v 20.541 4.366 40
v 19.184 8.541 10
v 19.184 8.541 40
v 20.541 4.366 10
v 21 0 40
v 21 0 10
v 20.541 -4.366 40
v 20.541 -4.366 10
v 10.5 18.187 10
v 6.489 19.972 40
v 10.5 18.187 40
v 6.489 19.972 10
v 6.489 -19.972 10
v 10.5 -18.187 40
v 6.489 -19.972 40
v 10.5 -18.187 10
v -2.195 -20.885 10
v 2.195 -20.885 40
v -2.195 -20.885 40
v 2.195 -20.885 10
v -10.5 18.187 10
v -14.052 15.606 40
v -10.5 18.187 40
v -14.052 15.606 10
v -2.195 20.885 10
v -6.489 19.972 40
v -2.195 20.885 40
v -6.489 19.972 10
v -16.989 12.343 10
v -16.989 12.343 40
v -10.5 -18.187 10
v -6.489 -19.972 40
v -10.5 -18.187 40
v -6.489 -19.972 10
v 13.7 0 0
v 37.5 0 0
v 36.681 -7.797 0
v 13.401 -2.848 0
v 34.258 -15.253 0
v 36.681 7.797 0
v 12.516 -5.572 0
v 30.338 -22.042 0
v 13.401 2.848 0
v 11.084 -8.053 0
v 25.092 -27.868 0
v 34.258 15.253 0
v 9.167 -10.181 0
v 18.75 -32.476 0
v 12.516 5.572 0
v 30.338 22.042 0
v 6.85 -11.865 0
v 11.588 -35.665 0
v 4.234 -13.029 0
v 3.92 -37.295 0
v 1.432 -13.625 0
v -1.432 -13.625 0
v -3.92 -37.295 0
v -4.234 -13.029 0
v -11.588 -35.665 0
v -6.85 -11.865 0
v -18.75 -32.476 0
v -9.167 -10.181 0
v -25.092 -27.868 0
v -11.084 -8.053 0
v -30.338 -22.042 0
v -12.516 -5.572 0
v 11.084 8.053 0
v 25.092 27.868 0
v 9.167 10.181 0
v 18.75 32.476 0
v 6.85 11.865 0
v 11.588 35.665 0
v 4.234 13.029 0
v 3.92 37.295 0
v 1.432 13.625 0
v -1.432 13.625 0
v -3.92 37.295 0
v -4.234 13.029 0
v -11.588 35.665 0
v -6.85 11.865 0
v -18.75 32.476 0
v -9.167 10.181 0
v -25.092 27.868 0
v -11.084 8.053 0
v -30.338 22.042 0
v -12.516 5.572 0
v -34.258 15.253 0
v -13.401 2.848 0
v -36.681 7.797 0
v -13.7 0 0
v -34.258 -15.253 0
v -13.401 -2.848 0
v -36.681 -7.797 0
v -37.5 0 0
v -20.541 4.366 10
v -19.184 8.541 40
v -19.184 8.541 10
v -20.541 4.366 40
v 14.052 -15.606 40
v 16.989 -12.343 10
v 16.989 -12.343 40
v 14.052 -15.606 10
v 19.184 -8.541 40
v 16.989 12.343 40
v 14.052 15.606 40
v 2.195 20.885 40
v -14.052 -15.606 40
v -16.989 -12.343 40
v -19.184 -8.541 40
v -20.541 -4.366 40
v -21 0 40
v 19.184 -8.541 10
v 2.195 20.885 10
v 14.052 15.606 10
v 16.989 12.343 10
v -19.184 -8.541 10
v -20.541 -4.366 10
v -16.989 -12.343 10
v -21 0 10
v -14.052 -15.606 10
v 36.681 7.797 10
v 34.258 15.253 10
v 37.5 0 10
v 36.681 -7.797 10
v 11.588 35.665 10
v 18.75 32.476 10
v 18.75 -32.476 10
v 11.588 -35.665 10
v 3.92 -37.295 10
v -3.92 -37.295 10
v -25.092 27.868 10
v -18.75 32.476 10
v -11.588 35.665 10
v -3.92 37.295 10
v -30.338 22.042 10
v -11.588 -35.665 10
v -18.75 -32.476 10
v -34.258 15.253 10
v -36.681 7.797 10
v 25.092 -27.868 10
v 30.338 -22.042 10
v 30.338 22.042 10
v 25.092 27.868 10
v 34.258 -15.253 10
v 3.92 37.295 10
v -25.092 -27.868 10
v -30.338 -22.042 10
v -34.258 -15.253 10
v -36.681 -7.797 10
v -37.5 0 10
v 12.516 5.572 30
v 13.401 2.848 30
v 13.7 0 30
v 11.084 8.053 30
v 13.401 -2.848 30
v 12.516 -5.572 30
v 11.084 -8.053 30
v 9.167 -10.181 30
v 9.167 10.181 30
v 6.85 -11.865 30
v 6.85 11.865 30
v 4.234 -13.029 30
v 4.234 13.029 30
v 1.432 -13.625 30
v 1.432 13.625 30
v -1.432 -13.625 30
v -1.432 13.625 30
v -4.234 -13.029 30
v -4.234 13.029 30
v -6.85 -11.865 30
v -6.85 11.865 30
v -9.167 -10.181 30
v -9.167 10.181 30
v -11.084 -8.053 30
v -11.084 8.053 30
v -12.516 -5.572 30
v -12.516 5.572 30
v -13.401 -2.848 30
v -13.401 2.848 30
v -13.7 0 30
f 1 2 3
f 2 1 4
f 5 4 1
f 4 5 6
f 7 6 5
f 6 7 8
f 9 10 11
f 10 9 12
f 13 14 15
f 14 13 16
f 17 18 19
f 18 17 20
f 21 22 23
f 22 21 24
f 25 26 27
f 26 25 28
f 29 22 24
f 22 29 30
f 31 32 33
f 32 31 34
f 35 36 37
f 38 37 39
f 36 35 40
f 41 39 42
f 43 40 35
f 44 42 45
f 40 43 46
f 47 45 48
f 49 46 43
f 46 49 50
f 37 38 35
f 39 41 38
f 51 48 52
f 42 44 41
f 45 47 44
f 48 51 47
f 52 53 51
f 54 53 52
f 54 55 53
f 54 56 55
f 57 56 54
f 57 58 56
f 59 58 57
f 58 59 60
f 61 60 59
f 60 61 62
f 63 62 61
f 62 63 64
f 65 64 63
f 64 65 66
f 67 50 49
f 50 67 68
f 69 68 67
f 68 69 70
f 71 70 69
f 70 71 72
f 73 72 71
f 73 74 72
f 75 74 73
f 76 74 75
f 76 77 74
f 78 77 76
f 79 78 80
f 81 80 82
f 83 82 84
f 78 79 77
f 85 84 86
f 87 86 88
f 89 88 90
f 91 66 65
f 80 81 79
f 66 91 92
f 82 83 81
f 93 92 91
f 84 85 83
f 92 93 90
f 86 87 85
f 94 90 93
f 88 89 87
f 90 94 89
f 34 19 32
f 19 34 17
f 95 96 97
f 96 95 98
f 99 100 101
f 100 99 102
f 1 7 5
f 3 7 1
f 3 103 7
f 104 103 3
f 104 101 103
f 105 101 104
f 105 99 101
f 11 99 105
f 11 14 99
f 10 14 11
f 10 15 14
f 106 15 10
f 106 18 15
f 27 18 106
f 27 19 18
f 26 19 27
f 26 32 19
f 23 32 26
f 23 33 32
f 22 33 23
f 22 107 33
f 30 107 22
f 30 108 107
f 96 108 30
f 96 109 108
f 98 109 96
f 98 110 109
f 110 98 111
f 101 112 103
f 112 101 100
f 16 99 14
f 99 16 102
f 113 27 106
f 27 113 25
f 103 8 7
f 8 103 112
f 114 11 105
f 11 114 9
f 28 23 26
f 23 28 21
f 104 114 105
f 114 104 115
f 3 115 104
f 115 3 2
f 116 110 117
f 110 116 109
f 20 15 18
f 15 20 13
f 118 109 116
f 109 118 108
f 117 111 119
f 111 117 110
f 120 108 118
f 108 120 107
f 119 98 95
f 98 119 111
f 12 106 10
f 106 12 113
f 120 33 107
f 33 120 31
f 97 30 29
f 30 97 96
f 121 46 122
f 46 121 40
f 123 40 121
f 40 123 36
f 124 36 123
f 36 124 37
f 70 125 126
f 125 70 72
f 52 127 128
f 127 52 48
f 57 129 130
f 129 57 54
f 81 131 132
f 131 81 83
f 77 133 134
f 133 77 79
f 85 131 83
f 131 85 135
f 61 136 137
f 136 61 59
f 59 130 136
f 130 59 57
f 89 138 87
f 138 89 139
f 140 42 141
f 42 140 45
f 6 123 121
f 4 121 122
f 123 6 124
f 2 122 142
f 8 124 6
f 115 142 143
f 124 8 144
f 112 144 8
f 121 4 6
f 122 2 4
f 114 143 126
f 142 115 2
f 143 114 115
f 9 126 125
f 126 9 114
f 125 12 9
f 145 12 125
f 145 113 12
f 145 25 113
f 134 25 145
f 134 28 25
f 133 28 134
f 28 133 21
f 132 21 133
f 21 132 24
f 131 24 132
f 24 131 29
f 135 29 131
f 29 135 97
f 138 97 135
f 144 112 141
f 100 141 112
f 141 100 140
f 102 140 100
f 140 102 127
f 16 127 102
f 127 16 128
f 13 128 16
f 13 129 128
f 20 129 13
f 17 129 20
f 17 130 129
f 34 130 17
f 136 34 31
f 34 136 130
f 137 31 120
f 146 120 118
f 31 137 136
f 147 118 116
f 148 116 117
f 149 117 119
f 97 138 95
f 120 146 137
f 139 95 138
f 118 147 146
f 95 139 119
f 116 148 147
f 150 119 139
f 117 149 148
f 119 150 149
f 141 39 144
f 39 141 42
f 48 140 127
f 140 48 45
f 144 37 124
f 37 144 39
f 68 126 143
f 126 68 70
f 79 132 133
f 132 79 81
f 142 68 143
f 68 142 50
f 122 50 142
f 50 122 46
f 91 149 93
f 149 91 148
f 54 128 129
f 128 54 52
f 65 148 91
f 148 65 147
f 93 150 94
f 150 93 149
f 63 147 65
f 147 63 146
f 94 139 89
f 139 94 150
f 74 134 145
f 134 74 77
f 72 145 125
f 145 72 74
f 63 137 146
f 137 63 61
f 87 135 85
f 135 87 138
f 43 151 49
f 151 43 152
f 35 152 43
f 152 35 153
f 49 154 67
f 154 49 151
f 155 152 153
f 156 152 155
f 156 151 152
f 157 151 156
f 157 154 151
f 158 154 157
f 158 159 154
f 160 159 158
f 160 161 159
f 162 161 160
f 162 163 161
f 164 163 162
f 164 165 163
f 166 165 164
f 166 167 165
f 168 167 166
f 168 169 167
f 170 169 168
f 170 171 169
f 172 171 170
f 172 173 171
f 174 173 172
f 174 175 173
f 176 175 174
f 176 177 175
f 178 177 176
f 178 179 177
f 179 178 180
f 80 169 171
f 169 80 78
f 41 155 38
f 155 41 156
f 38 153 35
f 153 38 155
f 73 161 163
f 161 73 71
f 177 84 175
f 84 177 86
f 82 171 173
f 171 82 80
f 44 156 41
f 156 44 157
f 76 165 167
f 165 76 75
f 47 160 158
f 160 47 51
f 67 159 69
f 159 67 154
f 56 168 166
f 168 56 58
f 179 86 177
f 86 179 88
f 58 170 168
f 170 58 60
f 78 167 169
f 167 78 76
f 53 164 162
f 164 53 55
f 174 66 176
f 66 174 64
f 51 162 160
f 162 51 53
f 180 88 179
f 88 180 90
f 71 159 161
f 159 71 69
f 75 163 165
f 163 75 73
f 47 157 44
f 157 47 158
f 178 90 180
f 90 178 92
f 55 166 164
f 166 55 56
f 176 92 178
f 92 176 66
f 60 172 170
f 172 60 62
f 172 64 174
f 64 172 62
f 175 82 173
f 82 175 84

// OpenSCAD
// file: bearing.scad
/*
 * Copyright (c) 2012 Haydn Vesta
 * 
 * See the file license.txt for copying permission.
 *
 */

include <wind_params.scad>


module bearing() {
  difference() {
    cylinder(h=bearing_height, r=bearing_or);
    cylinder(h=bearing_height, r=bearing_ir);
  }
}

bearing();
// file: wind_params.scad
/*
 * Copyright (c) 2012 Haydn Vesta
 * 
 * See the file license.txt for copying permission.
 *
 */


// FRAME
frame_thickness = 10;

// BLADE
blade_length = 1000;
blade_width = 40;
blade_base_width = 30;
blade_thickness = 3;
blade_count = 3;

// BEARING
bearing_ir = 35;
bearing_or = 55;
bearing_height = 25;

// POLE CAP
pole_radius = 12.7;
pole_cap_height = 40;
swivel_ir = 22.5;
swivel_or = 32.5;
// main file
/*
 * Copyright (c) 2012 Haydn Vesta
 * 
 * See the file license.txt for copying permission.
 *
 */

include <wind_params.scad>
use <bearing.scad>

module pole_cap() {
  difference() {
    union() {
      cylinder(h=pole_cap_height, r=swivel_ir - 1.5);
      cylinder(h=10, r=swivel_or + 5);
    }
    cylinder(h=pole_cap_height - 10, r=pole_radius + 1);
  }
}

pole_cap();
